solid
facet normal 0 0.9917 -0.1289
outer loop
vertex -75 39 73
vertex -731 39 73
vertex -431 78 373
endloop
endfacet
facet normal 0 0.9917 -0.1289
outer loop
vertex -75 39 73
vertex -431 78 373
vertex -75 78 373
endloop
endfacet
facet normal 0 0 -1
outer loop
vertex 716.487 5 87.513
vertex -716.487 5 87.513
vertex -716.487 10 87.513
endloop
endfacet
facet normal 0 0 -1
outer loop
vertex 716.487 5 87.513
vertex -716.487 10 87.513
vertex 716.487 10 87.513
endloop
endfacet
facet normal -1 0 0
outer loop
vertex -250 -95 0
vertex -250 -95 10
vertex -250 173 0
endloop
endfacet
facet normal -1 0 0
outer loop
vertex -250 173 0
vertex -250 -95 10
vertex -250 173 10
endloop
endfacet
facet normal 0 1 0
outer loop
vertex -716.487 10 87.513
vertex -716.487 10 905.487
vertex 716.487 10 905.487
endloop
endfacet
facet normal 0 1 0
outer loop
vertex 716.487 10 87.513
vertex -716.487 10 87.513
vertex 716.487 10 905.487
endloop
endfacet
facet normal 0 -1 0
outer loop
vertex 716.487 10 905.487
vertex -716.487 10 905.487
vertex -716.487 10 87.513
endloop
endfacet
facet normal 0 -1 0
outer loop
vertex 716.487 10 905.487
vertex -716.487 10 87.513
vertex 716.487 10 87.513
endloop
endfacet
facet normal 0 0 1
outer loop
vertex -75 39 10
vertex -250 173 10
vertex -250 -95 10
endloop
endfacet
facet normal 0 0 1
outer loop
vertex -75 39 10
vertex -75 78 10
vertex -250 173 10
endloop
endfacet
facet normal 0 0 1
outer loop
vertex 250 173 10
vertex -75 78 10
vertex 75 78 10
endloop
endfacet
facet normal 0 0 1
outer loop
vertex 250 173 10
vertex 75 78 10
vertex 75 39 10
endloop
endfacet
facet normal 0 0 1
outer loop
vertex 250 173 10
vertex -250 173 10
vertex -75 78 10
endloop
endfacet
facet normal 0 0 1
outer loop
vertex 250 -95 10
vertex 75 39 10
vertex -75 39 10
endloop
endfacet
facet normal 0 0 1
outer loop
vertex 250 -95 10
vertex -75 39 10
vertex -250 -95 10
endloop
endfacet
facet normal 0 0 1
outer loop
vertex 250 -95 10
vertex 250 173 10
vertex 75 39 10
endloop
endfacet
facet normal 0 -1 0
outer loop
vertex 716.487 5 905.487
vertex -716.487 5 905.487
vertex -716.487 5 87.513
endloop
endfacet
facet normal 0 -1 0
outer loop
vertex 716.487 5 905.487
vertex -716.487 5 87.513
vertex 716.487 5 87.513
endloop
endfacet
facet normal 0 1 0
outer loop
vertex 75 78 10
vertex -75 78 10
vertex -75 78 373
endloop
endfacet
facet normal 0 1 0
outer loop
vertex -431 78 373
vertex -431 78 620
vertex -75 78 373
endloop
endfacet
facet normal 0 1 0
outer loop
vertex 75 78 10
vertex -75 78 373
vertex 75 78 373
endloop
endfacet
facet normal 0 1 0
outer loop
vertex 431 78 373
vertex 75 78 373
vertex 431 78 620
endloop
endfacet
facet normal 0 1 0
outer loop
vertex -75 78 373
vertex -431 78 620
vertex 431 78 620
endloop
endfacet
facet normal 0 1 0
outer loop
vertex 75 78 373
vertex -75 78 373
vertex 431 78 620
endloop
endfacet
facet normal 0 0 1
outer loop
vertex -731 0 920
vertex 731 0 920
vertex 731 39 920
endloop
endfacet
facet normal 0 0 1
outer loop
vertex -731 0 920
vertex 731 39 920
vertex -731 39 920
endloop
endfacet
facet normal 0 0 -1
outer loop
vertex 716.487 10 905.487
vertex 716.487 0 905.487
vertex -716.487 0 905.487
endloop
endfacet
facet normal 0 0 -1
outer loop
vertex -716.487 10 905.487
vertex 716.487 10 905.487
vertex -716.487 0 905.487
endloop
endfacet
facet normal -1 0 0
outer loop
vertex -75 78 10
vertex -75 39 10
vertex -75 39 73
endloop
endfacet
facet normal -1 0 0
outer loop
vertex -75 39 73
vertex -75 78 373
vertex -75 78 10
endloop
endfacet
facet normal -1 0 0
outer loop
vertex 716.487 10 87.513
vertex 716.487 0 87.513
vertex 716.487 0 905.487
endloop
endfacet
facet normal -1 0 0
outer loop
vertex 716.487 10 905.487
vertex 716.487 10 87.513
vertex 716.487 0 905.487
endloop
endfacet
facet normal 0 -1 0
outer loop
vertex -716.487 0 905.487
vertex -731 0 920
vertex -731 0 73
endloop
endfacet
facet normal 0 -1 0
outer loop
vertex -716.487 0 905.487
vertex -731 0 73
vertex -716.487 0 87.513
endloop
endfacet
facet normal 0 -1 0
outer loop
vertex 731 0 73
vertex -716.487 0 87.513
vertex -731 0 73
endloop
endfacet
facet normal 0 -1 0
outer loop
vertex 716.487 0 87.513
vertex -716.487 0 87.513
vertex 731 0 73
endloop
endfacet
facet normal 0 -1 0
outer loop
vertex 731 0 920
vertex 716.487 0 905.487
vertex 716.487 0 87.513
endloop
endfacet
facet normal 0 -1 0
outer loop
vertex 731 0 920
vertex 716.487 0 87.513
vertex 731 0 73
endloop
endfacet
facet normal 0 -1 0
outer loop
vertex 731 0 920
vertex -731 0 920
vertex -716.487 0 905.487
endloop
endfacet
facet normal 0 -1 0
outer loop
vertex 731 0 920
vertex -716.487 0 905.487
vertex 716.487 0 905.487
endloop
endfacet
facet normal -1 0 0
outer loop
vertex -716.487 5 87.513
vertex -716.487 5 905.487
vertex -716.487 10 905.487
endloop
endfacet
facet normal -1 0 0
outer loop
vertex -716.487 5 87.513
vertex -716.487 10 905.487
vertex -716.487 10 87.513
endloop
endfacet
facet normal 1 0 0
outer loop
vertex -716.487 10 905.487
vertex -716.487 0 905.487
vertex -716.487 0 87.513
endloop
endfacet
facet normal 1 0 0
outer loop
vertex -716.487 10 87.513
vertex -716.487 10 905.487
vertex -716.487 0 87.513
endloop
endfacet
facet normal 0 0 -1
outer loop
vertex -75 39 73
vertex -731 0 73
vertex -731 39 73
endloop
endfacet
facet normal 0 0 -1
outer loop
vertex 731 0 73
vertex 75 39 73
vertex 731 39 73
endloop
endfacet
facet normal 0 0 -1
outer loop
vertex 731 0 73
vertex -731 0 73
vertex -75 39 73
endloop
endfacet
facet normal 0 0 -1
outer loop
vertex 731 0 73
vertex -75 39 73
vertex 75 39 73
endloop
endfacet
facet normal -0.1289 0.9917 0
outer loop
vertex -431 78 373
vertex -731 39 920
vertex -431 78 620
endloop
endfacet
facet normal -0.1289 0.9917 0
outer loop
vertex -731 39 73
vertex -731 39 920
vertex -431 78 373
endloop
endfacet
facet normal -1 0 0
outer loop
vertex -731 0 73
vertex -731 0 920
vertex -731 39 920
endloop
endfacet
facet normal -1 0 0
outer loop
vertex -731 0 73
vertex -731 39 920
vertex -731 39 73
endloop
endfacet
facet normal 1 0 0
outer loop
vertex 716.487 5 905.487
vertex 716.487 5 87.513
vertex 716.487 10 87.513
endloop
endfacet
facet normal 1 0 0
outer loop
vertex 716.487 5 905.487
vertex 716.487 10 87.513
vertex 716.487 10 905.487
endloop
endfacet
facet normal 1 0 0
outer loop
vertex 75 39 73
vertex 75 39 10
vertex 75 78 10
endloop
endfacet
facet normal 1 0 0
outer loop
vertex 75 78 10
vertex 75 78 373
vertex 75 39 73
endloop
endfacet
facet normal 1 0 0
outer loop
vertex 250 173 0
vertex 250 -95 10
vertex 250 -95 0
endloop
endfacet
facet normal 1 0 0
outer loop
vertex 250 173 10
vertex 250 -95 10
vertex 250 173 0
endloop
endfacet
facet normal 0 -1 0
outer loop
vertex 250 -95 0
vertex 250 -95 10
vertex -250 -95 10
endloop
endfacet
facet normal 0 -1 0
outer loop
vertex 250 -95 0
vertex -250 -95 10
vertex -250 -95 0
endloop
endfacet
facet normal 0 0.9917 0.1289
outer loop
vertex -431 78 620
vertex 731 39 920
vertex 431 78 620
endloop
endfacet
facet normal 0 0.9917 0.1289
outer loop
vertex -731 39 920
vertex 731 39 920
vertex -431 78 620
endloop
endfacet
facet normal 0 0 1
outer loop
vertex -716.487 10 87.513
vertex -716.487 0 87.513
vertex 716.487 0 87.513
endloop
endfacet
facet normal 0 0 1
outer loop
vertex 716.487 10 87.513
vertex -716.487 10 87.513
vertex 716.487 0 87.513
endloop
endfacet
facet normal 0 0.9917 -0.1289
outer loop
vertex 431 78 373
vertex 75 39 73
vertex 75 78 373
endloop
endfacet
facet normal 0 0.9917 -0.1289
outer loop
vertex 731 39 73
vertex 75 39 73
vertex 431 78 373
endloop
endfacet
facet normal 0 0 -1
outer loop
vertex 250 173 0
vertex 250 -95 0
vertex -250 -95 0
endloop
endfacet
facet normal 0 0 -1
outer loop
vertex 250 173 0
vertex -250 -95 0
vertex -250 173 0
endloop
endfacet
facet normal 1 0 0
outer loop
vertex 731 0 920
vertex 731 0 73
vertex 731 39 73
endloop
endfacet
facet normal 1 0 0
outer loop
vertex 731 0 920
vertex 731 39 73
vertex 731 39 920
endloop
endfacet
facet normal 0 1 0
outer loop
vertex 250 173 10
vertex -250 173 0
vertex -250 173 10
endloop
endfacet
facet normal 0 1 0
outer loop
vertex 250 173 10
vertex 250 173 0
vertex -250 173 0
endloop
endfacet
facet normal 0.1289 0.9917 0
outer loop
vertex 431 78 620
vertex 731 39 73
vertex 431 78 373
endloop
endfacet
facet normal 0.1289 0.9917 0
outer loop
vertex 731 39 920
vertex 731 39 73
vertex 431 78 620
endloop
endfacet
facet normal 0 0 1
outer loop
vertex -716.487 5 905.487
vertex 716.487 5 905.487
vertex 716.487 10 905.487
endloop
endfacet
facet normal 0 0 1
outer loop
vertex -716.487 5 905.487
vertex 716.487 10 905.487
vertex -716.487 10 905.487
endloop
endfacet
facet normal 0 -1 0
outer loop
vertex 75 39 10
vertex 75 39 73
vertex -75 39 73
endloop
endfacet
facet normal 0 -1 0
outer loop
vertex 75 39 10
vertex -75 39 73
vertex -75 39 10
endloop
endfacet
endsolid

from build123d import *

# Parameters (mm, degrees)
F2_DEPTH      = 78
F3_DEPTH      = 10
F4_START      = -5
F4_DEPTH      = 5
F5_SIZE2      = 39
F5_SIZE       = 300
F6_DEPTH      = 250
F6_DEPTH_BACK = 250
F1_W          = 39
F1_H          = 423.5
F1_H_2        = 63
F7_DEPTH      = 75
F7_DEPTH_BACK = 75


with BuildPart() as f2:
    # F0 (on Front) → F2 (new body)
    with BuildSketch(Plane.XZ):
        Polygon((0, 920), (-731, 920), (-731, 496.5), (-716.4874498823, 496.5), (-716.4874498823, 905.4874498823), (0, 905.4874498823), align=None)
        Polygon((731, 920), (0, 920), (0, 905.4874498823), (716.4874498823, 905.4874498823), (716.4874498823, 87.5125501177), (-716.4874498823, 87.5125501177), (-716.4874498823, 496.5), (-731, 496.5), (-731, 73), (0, 73), (731, 73), align=None)
        Polygon((716.4874498823, 905.4874498823), (0, 905.4874498823), (-716.4874498823, 905.4874498823), (-716.4874498823, 496.5), (-716.4874498823, 87.5125501177), (716.4874498823, 87.5125501177), align=None)
    extrude(amount=-F2_DEPTH)

    # F0 (on Front) → F3 (cut)
    with BuildSketch(Plane.XZ):
        Polygon((716.4874498823, 905.4874498823), (0, 905.4874498823), (-716.4874498823, 905.4874498823), (-716.4874498823, 496.5), (-716.4874498823, 87.5125501177), (716.4874498823, 87.5125501177), align=None)
    extrude(amount=-F3_DEPTH, mode=Mode.SUBTRACT)

    # F5
    f5_edges = [f2.edges().sort_by_distance(p)[0] for p in [
        (0, 78, 920),
        (-731, 78, 496.5),
        (0, 78, 73),
        (731, 78, 496.5),
    ]]
    f5_side = f2.faces().sort_by_distance((0, 78, 496.5))[0]
    chamfer(f5_edges, length=F5_SIZE, length2=F5_SIZE2, reference=f5_side)



with BuildPart() as f4:
    # F0 (on Front) → F4 (new body)
    with BuildSketch(Plane.XZ.offset(F4_START)):
        Polygon((716.4874498823, 905.4874498823), (0, 905.4874498823), (-716.4874498823, 905.4874498823), (-716.4874498823, 496.5), (-716.4874498823, 87.5125501177), (716.4874498823, 87.5125501177), align=None)
    extrude(amount=-F4_DEPTH)


with BuildPart() as f6:
    # F1 (on Right) → F6 (new body, two sides)
    with BuildSketch(Plane.YZ) as f6_sk:
        Polygon((173, 10), (78, 10), (39, 10), (-95, 10), (-95, 0), (173, 0), align=None)
    extrude(amount=F6_DEPTH)
    extrude(f6_sk.sketch, amount=-F6_DEPTH_BACK)


with BuildPart() as f2_1:
    add(f2.part)

    add(f6.part)  # F7 merges F6
    # F1 (on Right) → F7 (join, two sides)
    with BuildSketch(Plane.YZ) as f7_sk:
        with Locations((58.5, 284.75)):
            Rectangle(F1_W, F1_H)
        with Locations((58.5, 41.5)):
            Rectangle(F1_W, F1_H_2)
    extrude(amount=F7_DEPTH)
    extrude(f7_sk.sketch, amount=-F7_DEPTH_BACK)


solid = Compound([f4.part, f2_1.part])
